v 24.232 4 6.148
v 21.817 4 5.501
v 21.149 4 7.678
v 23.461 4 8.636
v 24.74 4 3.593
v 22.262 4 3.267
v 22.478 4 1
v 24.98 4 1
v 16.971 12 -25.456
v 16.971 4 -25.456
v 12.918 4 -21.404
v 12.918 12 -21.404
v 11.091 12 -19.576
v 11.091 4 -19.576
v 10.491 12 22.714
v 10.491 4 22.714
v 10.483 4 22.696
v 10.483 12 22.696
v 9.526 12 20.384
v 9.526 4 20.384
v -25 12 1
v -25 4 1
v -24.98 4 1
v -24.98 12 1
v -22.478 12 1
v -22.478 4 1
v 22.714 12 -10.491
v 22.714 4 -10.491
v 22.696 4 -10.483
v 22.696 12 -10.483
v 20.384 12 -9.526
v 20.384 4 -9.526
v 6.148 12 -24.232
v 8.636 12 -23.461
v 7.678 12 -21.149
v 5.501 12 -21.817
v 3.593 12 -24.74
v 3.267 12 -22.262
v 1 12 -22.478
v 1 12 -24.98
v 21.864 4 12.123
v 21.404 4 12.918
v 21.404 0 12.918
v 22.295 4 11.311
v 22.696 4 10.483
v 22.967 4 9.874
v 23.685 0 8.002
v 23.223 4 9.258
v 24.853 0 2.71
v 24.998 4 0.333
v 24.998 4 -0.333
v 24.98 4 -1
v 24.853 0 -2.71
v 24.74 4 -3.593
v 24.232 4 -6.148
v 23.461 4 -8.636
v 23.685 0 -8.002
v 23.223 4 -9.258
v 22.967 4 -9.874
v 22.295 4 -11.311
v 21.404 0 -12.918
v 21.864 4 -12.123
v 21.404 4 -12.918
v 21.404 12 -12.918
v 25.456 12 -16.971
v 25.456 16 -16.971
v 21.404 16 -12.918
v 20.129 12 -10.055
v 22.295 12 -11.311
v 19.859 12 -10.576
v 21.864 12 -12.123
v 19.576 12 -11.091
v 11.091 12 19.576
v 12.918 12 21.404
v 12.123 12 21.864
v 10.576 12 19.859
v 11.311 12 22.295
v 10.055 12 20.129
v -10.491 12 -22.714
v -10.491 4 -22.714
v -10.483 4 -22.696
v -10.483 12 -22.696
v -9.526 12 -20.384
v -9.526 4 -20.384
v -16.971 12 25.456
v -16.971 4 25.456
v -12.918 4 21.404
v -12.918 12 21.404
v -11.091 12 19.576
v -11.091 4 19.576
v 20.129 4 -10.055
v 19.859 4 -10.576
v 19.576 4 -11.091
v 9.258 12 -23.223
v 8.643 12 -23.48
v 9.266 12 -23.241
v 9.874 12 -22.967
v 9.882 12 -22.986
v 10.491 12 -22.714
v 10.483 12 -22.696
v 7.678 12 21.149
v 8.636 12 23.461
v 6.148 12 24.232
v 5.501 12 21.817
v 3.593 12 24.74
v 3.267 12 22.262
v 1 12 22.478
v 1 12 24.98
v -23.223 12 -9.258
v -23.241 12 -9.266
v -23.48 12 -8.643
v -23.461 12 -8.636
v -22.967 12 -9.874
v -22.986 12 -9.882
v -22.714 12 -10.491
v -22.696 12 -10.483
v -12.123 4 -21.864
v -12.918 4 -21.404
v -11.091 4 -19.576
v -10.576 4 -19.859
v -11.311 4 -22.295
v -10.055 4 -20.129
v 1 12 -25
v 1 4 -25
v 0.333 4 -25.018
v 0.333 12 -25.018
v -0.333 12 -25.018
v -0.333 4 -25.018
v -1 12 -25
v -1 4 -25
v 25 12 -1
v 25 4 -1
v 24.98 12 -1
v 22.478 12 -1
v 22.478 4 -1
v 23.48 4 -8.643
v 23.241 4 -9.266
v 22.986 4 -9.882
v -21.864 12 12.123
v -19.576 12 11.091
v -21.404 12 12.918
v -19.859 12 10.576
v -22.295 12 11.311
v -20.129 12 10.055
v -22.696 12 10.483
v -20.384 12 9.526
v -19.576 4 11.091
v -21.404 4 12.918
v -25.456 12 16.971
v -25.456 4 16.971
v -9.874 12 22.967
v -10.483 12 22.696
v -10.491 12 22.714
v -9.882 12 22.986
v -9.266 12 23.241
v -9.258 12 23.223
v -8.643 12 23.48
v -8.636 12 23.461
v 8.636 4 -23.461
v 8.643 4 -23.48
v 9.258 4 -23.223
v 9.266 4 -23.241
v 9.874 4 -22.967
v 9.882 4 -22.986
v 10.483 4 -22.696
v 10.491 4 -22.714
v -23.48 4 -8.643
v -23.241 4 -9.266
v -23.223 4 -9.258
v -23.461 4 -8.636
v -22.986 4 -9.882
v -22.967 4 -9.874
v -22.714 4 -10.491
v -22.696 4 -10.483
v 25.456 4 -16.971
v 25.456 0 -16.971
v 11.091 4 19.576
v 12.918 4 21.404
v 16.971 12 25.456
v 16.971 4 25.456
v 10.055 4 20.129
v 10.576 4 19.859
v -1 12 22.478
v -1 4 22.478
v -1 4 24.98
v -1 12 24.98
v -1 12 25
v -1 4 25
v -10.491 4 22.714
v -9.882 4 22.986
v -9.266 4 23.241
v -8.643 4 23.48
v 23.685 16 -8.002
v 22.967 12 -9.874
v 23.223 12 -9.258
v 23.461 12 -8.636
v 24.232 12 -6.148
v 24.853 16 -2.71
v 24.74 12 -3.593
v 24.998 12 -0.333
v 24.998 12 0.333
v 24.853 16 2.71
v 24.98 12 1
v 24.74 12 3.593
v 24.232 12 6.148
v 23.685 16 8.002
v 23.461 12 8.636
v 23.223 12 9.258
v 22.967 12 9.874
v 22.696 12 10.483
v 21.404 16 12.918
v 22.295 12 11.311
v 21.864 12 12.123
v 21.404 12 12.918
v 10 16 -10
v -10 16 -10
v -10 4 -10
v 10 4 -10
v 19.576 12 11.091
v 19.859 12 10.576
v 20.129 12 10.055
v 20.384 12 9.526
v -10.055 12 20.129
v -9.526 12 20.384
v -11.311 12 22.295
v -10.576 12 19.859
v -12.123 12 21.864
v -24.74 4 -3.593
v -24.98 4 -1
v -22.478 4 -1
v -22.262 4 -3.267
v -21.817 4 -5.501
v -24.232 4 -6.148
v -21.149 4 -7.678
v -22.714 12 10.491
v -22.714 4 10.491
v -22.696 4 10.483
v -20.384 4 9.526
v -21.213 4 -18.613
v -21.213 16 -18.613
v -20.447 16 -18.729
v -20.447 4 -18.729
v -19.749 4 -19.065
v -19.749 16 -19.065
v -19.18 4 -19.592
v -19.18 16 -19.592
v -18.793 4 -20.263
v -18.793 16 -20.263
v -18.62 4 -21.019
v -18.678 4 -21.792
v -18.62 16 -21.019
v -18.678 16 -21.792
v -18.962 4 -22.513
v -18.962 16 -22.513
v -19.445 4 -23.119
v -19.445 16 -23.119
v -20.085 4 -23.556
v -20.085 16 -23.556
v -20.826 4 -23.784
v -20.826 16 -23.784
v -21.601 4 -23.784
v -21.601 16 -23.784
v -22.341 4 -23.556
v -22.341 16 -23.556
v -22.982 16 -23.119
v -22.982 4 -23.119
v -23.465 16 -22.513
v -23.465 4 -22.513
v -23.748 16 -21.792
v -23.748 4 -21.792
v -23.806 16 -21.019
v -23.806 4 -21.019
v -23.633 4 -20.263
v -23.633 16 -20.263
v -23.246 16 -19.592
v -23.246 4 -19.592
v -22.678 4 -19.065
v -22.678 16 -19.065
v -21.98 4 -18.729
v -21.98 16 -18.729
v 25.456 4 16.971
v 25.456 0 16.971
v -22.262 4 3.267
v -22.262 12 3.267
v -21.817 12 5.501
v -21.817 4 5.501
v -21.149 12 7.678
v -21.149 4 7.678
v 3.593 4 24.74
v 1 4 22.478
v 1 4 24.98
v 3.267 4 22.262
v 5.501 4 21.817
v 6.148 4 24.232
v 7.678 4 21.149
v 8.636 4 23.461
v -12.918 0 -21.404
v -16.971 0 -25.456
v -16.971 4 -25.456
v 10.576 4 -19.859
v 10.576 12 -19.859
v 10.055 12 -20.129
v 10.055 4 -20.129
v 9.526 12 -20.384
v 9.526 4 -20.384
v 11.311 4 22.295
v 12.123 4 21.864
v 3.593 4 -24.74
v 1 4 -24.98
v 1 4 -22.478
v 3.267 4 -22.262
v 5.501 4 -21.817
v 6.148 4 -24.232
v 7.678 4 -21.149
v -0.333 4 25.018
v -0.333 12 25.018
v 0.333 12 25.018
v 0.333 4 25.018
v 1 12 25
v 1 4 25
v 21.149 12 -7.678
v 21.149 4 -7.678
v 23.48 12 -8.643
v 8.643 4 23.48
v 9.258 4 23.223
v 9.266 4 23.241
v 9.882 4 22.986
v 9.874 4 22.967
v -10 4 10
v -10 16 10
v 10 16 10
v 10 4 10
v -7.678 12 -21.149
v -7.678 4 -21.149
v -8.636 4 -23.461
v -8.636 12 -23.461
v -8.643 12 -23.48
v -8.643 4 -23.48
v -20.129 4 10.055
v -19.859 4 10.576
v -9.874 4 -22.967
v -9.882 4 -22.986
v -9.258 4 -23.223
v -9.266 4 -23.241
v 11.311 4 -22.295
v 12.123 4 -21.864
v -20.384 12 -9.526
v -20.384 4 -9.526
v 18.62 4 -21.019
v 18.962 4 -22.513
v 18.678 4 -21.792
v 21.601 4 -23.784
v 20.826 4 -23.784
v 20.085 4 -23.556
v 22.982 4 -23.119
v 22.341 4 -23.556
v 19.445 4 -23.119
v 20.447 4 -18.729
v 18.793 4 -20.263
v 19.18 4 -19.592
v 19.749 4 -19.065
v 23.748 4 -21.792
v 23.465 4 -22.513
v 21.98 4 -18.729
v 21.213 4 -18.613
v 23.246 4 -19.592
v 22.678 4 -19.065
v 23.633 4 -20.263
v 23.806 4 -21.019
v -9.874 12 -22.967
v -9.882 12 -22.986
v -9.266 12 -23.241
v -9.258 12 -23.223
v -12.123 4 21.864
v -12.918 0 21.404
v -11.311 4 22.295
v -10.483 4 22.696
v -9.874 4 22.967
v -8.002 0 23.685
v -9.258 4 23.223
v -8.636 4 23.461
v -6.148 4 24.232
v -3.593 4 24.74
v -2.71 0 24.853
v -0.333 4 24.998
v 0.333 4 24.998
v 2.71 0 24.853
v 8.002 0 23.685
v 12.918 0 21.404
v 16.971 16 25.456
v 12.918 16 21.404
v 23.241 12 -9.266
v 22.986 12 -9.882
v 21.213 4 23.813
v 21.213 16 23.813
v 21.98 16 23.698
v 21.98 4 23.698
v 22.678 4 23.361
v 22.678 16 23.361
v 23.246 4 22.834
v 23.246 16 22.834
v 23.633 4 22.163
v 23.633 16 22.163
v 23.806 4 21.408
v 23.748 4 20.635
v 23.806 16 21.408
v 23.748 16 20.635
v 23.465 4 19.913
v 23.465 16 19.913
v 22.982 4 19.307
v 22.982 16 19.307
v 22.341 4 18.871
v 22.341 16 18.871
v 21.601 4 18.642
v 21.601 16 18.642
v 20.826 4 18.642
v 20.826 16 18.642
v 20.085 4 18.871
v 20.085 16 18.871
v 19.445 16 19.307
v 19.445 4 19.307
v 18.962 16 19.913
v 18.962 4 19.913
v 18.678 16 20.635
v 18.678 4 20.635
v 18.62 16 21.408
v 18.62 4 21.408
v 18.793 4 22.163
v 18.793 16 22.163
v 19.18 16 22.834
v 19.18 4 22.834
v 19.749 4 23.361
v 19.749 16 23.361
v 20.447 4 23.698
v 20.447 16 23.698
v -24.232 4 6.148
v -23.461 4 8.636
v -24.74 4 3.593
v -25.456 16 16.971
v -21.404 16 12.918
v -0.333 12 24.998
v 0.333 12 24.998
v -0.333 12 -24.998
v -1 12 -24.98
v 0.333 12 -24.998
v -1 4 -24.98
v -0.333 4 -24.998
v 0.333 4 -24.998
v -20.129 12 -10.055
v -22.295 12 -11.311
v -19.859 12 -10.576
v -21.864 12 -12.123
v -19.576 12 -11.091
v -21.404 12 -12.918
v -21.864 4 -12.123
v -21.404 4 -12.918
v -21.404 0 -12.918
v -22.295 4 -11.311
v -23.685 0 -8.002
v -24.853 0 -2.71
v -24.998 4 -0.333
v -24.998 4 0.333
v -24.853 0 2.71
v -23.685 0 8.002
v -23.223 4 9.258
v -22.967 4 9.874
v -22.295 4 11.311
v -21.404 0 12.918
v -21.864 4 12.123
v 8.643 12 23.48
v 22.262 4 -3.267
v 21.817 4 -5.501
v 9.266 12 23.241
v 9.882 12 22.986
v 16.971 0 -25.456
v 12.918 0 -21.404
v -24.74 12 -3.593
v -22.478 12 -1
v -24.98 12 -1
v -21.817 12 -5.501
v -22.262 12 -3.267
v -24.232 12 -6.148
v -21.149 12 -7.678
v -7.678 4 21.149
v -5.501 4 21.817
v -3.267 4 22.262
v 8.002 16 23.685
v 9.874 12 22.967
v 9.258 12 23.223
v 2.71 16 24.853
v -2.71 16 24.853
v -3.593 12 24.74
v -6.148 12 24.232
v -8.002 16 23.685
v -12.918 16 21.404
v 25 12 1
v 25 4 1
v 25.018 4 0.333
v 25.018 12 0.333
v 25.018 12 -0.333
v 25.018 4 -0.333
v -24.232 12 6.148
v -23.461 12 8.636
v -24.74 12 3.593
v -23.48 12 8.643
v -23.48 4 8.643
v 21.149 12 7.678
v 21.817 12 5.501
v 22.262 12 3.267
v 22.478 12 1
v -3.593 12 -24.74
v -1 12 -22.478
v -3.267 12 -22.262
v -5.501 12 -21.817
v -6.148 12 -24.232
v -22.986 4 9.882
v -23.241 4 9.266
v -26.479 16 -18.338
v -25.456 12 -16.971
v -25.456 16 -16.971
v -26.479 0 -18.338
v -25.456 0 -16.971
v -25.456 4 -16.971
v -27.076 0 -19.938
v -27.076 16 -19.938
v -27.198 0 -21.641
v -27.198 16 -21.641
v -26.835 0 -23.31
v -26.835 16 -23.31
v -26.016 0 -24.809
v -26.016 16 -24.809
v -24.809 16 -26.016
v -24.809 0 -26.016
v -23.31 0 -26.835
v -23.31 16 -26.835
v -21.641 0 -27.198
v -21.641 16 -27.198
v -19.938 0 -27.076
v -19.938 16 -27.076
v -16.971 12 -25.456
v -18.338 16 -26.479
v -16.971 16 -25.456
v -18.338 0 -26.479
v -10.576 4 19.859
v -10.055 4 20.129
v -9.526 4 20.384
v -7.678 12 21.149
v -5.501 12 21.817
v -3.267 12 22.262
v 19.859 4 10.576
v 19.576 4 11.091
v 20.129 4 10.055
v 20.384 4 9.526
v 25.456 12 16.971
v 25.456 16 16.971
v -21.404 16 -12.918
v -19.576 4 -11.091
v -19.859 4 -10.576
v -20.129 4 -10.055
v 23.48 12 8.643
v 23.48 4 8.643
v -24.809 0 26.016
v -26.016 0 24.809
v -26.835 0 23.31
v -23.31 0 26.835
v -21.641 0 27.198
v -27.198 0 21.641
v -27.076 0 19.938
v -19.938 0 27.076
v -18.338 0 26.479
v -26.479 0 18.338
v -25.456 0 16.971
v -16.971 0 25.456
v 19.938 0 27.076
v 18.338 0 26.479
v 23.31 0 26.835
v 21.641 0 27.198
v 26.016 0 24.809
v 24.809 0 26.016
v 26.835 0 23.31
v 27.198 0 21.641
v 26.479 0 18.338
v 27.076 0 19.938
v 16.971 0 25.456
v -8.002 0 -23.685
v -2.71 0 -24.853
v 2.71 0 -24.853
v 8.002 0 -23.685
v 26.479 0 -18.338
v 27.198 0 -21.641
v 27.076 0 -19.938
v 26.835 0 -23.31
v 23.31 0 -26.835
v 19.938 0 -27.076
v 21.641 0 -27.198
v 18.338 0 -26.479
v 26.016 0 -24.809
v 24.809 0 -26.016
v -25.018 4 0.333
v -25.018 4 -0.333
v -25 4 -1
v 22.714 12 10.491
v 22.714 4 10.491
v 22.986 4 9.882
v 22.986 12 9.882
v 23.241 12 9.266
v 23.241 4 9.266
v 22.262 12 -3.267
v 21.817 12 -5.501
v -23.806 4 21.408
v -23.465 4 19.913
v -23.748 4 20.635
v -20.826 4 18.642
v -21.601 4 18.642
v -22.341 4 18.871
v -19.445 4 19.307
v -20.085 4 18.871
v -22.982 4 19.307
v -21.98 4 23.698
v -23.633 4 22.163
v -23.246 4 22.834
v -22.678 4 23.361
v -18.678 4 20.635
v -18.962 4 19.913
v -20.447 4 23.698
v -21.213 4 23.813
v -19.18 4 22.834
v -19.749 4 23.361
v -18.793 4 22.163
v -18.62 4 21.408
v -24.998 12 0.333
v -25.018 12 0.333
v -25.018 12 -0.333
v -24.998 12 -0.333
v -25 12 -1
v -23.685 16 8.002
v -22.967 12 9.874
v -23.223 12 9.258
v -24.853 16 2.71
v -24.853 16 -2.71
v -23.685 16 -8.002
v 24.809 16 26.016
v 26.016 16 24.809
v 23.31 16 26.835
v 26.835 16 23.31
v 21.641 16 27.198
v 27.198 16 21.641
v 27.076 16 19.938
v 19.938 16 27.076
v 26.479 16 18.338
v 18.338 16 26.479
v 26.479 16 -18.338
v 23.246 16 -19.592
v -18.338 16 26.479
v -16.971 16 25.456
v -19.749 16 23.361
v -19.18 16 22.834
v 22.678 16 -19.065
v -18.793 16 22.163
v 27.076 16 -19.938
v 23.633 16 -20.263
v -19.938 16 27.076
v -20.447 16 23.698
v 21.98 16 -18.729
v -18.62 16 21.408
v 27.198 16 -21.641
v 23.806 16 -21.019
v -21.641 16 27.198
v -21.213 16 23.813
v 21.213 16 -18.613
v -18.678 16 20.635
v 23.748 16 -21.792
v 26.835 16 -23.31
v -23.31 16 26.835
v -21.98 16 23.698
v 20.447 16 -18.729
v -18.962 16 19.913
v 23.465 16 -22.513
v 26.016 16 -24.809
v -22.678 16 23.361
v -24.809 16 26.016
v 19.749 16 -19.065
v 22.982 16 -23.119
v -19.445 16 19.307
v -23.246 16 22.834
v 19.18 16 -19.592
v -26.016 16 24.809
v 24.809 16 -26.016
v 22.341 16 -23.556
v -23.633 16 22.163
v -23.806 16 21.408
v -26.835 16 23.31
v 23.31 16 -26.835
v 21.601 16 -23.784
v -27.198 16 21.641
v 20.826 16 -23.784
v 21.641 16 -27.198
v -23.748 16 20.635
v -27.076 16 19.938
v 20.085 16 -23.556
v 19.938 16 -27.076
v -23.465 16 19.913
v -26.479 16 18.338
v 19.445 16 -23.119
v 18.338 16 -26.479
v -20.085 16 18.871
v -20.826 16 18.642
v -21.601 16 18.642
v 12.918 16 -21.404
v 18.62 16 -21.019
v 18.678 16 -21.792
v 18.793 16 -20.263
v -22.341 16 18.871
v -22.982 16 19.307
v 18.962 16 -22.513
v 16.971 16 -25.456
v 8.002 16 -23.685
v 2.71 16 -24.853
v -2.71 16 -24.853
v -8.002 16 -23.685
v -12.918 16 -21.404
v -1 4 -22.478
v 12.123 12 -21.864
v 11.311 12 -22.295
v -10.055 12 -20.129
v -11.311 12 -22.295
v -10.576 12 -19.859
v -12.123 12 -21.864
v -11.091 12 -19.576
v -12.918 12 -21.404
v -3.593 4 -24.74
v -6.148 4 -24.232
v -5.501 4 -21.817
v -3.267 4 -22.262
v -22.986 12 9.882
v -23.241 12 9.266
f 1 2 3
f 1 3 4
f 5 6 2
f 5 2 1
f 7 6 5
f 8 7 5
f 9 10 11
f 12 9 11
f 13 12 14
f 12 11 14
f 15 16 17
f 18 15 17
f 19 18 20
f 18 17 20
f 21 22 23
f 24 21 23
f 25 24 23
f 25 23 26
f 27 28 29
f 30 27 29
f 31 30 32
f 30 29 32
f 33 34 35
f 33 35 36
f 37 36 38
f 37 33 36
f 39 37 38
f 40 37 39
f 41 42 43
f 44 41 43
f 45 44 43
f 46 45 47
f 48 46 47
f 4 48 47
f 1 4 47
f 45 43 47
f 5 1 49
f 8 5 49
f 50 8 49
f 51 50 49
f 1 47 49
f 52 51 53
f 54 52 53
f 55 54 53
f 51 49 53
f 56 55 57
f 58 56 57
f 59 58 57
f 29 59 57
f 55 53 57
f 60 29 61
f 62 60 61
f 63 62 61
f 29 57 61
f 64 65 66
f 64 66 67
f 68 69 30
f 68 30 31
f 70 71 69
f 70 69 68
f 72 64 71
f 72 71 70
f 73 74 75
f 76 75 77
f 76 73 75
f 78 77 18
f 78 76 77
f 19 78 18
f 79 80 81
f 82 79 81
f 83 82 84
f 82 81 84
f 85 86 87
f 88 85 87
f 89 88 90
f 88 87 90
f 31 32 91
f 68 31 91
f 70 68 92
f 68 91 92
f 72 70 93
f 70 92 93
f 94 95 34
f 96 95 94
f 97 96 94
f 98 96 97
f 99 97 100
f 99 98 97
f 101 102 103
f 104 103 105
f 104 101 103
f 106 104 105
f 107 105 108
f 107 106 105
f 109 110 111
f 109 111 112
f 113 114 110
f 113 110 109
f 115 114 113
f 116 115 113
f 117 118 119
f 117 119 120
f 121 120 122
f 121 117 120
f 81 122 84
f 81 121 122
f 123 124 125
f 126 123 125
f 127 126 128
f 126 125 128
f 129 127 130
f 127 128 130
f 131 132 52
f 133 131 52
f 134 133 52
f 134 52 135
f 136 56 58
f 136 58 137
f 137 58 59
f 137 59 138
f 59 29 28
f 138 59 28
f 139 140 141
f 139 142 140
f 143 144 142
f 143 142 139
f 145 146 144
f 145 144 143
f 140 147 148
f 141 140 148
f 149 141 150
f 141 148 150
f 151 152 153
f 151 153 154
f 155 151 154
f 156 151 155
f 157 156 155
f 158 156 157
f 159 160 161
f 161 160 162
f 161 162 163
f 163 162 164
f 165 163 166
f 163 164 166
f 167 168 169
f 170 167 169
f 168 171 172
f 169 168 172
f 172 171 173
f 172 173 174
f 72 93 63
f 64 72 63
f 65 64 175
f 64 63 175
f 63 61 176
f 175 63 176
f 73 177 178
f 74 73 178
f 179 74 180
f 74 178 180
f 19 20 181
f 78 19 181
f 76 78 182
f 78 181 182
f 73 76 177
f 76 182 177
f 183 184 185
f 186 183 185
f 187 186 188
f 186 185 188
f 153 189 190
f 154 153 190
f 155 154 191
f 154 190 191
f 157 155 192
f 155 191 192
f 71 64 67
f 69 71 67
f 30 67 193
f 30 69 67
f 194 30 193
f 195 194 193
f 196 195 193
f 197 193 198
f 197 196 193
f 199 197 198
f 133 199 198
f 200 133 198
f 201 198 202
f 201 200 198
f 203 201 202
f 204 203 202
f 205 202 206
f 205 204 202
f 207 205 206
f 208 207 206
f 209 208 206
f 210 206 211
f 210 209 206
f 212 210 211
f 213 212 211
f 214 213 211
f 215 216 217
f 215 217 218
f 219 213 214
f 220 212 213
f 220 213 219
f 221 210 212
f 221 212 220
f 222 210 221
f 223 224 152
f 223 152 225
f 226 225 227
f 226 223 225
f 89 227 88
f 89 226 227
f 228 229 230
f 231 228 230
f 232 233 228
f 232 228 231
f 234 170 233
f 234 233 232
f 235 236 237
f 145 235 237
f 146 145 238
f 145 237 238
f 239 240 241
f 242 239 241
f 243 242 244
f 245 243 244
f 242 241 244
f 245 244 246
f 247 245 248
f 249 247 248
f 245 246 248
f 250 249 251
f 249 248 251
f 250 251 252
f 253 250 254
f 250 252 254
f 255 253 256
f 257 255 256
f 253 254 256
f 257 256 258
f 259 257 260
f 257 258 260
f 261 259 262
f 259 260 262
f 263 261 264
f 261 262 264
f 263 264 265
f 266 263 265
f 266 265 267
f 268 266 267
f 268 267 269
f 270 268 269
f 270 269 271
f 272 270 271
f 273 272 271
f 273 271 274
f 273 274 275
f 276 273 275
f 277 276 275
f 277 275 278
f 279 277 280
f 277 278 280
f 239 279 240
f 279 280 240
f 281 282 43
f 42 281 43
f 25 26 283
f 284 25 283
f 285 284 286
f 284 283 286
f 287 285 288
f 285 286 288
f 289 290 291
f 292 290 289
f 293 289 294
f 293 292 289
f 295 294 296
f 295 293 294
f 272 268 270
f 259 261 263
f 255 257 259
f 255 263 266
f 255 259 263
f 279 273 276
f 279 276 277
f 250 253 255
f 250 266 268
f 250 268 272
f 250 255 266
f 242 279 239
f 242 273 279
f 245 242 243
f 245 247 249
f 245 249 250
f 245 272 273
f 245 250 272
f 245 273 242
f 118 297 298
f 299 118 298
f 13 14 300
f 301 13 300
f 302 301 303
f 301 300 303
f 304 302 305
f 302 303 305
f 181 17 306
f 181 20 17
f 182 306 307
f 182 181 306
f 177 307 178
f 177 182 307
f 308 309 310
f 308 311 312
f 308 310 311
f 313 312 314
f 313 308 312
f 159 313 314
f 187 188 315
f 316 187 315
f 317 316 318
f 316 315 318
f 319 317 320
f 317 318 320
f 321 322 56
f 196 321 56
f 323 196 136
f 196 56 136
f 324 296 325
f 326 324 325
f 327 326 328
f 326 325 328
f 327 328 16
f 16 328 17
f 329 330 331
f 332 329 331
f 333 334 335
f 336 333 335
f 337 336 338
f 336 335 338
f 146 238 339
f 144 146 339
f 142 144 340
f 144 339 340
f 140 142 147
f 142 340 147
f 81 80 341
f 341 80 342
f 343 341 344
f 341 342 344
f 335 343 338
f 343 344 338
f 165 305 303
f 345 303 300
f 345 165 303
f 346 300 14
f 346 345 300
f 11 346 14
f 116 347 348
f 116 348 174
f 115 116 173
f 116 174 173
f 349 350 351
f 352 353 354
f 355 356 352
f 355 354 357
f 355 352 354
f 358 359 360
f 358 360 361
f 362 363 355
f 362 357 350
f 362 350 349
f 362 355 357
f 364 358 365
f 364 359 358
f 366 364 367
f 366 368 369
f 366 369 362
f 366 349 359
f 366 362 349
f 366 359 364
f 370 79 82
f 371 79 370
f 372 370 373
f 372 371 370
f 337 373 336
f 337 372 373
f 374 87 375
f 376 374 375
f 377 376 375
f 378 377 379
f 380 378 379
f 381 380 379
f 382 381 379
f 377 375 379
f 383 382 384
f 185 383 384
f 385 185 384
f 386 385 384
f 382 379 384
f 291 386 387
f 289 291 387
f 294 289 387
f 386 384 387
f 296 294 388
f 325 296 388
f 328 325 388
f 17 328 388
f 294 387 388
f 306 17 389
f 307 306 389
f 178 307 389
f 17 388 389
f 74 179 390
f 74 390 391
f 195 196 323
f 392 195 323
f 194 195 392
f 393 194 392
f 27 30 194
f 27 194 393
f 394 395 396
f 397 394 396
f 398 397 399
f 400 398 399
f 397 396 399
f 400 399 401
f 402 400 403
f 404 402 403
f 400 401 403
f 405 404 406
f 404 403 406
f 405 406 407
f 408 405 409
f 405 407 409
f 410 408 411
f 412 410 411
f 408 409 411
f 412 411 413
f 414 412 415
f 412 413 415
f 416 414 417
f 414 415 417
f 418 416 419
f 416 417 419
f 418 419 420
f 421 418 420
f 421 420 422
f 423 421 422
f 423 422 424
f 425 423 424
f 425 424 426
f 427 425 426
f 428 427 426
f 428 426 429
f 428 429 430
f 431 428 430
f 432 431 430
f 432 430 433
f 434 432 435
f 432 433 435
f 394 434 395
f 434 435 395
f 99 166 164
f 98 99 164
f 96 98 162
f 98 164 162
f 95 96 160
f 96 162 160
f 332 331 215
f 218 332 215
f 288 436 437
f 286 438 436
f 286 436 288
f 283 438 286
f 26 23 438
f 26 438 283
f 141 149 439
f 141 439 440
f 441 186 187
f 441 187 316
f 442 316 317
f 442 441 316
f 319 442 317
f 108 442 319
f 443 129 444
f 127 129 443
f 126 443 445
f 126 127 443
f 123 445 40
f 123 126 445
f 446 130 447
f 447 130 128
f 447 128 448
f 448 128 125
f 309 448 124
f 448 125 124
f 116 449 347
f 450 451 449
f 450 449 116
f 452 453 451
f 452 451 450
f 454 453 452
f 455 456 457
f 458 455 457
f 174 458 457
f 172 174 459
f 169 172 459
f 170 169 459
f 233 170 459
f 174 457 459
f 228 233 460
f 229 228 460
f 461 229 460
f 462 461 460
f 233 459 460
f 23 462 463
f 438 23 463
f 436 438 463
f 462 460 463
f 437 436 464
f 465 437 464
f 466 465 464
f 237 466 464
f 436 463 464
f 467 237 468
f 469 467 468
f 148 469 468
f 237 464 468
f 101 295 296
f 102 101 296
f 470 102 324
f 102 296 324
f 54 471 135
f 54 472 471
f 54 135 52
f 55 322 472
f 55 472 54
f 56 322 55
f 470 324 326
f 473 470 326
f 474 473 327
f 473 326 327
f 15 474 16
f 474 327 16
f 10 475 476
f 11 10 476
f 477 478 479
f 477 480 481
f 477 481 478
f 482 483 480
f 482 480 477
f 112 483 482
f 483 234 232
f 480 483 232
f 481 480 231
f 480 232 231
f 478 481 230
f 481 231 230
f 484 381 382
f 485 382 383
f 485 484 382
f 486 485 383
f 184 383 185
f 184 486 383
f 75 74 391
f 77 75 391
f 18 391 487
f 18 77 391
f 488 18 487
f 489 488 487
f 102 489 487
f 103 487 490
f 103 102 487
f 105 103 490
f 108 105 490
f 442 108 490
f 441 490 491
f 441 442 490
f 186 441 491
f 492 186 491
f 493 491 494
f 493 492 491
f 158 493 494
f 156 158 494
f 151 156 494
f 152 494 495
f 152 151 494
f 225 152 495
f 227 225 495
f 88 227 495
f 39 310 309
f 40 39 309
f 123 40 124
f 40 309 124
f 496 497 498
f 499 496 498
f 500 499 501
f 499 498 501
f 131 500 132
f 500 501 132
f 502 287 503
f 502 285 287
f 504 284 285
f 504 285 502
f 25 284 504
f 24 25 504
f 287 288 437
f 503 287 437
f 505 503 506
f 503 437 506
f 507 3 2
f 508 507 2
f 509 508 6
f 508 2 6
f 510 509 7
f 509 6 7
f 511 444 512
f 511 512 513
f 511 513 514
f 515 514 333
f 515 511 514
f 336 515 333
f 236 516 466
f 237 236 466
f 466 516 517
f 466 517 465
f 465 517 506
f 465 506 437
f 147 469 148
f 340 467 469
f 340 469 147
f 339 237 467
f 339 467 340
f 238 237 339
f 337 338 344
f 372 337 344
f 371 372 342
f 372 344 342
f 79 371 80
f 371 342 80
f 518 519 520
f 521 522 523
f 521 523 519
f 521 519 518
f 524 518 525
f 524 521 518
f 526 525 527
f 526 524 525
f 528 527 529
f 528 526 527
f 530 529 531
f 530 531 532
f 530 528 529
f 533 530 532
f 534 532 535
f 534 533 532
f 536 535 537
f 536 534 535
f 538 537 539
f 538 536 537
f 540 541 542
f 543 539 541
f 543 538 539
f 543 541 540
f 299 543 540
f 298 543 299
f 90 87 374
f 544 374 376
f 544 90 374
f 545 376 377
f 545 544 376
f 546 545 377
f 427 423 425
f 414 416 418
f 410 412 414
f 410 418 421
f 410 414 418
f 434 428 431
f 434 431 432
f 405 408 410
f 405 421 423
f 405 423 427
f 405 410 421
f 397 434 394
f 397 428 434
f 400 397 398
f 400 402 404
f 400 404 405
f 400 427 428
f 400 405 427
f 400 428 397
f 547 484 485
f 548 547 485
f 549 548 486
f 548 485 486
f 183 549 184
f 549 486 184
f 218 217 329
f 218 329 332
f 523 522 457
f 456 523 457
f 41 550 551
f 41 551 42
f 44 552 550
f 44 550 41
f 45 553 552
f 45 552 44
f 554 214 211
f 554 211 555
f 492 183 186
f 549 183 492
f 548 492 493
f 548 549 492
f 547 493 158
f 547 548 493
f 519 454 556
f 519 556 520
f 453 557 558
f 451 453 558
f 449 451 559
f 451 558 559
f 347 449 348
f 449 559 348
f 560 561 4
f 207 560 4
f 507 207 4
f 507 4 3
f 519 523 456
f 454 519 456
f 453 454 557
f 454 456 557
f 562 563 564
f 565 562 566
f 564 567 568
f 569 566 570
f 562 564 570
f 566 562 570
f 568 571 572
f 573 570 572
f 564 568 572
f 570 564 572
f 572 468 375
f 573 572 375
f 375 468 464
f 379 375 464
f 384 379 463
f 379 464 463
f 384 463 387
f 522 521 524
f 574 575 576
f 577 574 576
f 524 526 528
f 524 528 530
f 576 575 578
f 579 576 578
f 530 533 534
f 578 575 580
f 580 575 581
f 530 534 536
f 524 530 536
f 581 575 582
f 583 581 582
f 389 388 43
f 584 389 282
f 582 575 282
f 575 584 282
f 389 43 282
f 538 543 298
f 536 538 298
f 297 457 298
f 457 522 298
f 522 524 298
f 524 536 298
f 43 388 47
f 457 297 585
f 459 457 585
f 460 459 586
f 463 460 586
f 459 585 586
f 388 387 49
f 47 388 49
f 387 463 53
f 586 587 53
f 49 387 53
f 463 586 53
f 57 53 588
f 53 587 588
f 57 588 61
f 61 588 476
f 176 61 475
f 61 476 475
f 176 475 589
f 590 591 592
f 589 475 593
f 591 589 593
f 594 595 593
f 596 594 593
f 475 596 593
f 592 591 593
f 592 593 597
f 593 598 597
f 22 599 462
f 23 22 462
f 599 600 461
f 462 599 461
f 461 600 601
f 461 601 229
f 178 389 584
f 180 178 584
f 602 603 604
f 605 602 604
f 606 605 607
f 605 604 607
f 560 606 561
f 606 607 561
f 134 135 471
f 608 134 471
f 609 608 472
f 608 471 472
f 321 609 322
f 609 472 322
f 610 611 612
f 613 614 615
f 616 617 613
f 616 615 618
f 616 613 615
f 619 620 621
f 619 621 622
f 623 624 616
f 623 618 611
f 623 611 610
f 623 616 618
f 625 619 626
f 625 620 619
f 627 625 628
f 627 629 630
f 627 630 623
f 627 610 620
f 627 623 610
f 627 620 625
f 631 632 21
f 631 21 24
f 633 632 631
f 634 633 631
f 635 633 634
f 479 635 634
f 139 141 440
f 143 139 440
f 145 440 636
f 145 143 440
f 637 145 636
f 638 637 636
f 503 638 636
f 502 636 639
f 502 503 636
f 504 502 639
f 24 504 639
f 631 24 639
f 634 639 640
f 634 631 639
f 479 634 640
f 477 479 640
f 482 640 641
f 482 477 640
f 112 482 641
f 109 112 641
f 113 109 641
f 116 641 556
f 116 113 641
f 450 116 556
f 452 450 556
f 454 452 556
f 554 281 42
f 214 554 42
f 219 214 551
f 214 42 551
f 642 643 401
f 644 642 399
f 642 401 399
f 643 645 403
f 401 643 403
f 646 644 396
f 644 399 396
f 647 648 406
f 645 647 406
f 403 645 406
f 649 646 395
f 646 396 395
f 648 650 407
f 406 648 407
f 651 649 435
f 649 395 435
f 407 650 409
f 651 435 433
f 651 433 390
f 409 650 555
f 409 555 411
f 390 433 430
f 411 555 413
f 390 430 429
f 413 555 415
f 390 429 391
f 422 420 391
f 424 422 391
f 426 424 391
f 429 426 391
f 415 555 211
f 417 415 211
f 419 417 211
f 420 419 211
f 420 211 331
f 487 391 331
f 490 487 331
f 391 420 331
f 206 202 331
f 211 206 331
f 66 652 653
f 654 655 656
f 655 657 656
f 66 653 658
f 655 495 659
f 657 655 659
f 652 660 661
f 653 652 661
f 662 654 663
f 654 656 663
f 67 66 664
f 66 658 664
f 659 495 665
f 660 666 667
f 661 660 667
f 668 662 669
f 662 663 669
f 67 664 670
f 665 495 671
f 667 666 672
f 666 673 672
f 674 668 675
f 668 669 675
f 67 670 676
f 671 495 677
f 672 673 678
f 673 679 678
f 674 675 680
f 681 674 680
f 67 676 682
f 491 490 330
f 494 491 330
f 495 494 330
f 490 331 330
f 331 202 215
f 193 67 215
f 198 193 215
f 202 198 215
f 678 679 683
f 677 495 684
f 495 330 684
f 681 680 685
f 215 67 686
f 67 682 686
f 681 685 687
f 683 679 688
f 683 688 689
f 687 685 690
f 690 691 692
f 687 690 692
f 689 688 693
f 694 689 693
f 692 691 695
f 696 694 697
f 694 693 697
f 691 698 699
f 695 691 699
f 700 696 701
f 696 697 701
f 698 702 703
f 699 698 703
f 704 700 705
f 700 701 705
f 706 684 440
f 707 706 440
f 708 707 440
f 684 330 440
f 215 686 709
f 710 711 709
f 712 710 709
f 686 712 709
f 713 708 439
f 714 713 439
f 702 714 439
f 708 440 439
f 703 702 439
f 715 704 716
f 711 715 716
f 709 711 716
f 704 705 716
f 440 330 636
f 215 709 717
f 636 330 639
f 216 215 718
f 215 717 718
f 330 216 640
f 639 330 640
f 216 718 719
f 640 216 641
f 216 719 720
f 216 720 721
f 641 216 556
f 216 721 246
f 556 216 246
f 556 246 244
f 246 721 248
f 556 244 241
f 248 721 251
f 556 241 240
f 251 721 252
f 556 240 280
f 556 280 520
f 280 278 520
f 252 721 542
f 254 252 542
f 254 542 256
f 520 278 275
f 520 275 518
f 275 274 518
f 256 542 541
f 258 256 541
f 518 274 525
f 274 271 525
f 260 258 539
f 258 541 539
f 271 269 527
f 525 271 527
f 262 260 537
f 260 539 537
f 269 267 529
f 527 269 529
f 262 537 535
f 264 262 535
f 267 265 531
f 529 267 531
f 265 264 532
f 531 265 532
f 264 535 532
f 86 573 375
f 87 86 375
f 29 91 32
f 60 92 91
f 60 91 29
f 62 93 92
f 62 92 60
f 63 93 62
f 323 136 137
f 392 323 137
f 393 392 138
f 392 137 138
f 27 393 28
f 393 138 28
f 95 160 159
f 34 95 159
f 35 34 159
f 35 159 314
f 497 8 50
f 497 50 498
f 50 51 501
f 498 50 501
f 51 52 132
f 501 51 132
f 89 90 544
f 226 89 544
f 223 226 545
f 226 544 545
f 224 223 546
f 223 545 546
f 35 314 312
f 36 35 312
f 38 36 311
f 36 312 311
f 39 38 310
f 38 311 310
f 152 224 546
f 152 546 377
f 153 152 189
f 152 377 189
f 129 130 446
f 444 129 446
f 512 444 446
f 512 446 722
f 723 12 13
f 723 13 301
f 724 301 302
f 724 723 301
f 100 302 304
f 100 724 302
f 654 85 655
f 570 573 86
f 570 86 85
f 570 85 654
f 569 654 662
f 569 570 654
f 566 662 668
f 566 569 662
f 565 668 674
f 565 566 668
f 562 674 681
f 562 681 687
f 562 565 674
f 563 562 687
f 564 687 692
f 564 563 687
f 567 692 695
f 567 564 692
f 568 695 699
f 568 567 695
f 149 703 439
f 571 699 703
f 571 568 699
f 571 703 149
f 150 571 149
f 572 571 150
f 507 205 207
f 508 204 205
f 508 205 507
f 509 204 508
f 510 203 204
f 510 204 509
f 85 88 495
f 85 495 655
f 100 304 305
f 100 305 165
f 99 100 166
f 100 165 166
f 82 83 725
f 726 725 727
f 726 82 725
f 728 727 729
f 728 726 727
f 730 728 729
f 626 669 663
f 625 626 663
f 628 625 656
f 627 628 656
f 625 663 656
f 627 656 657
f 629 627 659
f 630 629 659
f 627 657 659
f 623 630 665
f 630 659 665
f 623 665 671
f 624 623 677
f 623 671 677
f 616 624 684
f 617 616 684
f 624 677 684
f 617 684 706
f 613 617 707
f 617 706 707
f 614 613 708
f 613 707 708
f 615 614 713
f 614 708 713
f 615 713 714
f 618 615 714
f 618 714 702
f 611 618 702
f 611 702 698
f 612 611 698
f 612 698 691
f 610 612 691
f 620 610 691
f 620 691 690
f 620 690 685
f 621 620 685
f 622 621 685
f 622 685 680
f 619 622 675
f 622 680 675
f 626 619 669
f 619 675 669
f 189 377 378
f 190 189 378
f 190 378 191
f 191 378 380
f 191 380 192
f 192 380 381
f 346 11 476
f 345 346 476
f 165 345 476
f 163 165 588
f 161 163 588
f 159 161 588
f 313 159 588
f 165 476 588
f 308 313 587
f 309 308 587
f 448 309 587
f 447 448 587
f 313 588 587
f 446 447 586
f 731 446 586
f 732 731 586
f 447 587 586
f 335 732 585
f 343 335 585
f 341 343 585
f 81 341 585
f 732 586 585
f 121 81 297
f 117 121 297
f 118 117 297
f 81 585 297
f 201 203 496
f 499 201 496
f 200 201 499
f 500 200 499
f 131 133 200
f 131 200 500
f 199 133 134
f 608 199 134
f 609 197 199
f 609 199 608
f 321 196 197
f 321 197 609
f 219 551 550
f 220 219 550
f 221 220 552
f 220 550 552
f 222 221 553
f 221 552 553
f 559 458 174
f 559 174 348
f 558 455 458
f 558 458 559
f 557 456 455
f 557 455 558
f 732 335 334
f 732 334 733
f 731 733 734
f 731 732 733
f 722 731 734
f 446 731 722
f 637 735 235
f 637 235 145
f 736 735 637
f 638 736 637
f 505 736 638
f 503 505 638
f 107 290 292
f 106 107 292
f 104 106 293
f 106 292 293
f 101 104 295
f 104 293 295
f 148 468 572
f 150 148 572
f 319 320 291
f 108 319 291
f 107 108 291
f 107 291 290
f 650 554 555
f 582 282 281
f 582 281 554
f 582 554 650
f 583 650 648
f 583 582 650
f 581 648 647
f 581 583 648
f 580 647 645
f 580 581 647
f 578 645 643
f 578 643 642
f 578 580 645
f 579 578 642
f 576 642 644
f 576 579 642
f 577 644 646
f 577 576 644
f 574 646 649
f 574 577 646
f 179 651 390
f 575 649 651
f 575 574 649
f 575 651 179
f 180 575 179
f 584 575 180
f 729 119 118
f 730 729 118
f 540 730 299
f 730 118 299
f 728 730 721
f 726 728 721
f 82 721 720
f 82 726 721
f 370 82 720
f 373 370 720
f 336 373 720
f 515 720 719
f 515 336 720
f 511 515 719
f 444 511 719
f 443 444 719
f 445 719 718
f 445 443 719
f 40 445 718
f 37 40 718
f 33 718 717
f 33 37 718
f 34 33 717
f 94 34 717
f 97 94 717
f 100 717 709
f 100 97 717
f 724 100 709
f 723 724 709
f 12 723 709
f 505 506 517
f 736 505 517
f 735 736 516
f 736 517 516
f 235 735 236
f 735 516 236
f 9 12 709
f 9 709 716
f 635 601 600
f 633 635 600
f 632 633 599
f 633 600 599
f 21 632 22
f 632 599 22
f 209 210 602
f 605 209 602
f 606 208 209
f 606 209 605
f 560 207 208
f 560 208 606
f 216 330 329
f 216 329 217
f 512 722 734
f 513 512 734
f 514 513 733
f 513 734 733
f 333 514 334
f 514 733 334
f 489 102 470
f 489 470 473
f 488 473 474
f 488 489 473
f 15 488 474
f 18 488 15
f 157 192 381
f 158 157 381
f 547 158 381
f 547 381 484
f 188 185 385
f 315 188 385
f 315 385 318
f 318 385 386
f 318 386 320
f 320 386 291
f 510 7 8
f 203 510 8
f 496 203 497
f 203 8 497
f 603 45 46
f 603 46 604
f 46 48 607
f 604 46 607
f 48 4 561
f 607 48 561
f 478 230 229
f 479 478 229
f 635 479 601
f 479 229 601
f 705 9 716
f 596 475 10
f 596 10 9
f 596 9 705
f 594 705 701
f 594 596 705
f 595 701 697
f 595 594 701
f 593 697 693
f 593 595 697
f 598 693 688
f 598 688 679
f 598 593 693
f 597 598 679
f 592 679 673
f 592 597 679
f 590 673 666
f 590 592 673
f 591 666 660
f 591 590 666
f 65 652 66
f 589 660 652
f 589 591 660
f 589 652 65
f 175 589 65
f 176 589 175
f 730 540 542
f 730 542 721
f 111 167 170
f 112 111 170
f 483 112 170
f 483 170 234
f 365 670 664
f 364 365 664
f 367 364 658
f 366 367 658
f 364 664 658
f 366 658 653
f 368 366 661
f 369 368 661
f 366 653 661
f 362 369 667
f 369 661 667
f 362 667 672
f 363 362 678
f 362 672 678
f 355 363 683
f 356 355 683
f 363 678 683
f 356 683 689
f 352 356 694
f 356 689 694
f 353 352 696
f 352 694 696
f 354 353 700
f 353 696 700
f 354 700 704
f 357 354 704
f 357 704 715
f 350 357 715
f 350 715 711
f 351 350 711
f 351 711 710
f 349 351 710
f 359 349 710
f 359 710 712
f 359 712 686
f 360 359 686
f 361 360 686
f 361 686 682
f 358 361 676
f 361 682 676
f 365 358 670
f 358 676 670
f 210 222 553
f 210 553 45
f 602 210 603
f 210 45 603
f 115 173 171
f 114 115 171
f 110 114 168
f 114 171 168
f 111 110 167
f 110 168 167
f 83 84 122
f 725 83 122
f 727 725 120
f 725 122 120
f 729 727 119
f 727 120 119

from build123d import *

# Parameters (mm, degrees)
BOSS_EXTRUDE1_DEPTH = 4
BOSS_EXTRUDE2_DEPTH = 8
BOSS_EXTRUDE3_DEPTH = 4
SKETCH4_R           = 2.6
CUT_EXTRUDE1_DEPTH  = 12
SKETCH5_W           = 20
SKETCH5_H           = 20
CUT_EXTRUDE2_DEPTH  = 12


with BuildPart() as part:
    # Sketch1 → Boss-Extrude1 (new body)
    with BuildSketch(Plane(origin=(0, 0, 0), x_dir=(1, 0, 0), z_dir=(0, 1, 0))):
        with BuildLine():
            Line((21.403642989, 12.918361615), (25.455844123, 16.970562748))
            ThreePointArc((25.455844123, 16.970562748), (25.455844123, 25.455844123), (16.970562748, 25.455844123))
            Line((16.970562748, 25.455844123), (12.918361615, 21.403642989))
            ThreePointArc((12.918361615, 21.403642989), (0, 25), (-12.918361615, 21.403642989))
            Line((-12.918361615, 21.403642989), (-16.970562748, 25.455844123))
            ThreePointArc((-16.970562748, 25.455844123), (-25.455844123, 25.455844123), (-25.455844123, 16.970562748))
            Line((-25.455844123, 16.970562748), (-21.403642989, 12.918361615))
            ThreePointArc((-21.403642989, 12.918361615), (-25, 0), (-21.403642989, -12.918361615))
            Line((-21.403642989, -12.918361615), (-25.455844123, -16.970562748))
            ThreePointArc((-25.455844123, -16.970562748), (-25.455844123, -25.455844123), (-16.970562748, -25.455844123))
            Line((-16.970562748, -25.455844123), (-12.918361615, -21.403642989))
            ThreePointArc((-12.918361615, -21.403642989), (0, -25), (12.918361615, -21.403642989))
            Line((12.918361615, -21.403642989), (16.970562748, -25.455844123))
            ThreePointArc((16.970562748, -25.455844123), (25.455844123, -25.455844123), (25.455844123, -16.970562748))
            Line((25.455844123, -16.970562748), (21.403642989, -12.918361615))
            ThreePointArc((21.403642989, -12.918361615), (25, 0), (21.403642989, 12.918361615))
        make_face()
    extrude(amount=BOSS_EXTRUDE1_DEPTH)

    # Sketch2 → Boss-Extrude2 (add)
    with BuildSketch(Plane(origin=(0, 4, 0), x_dir=(1, 0, 0), z_dir=(0, 1, 0))):
        with BuildLine():
            Line((-1, 25), (-1, 22.477766793))
            ThreePointArc((-1, 22.477766793), (-4.389532245, 22.067668809), (-7.677989416, 21.149432109))
            Line((-7.677989416, 21.149432109), (-8.643206277, 23.479671745))
            ThreePointArc((-8.643206277, 23.479671745), (-9.574736419, 23.115458518), (-10.490965342, 22.71430488))
            Line((-10.490965342, 22.71430488), (-9.525748481, 20.384065244))
            ThreePointArc((-9.525748481, 20.384065244), (-10.316353506, 19.995570768), (-11.091145538, 19.576426912))
            Line((-11.091145538, 19.576426912), (-16.970562748, 25.455844123))
            ThreePointArc((-16.970562748, 25.455844123), (-25.455844123, 25.455844123), (-25.455844123, 16.970562748))
            Line((-25.455844123, 16.970562748), (-19.576426912, 11.091145538))
            ThreePointArc((-19.576426912, 11.091145538), (-19.995570768, 10.316353506), (-20.384065244, 9.525748481))
            Line((-20.384065244, 9.525748481), (-22.71430488, 10.490965342))
            ThreePointArc((-22.71430488, 10.490965342), (-23.115458518, 9.574736419), (-23.479671745, 8.643206277))
            Line((-23.479671745, 8.643206277), (-21.149432109, 7.677989416))
            ThreePointArc((-21.149432109, 7.677989416), (-22.067668809, 4.389532245), (-22.477766793, 1))
            Line((-22.477766793, 1), (-25, 1))
            ThreePointArc((-25, 1), (-25.019992006, 0), (-25, -1))
            Line((-25, -1), (-22.477766793, -1))
            ThreePointArc((-22.477766793, -1), (-22.067668809, -4.389532245), (-21.149432109, -7.677989416))
            Line((-21.149432109, -7.677989416), (-23.479671745, -8.643206277))
            ThreePointArc((-23.479671745, -8.643206277), (-23.115458518, -9.574736419), (-22.71430488, -10.490965342))
            Line((-22.71430488, -10.490965342), (-20.384065244, -9.525748481))
            ThreePointArc((-20.384065244, -9.525748481), (-19.995570768, -10.316353506), (-19.576426912, -11.091145538))
            Line((-19.576426912, -11.091145538), (-25.455844123, -16.970562748))
            ThreePointArc((-25.455844123, -16.970562748), (-25.455844123, -25.455844123), (-16.970562748, -25.455844123))
            Line((-16.970562748, -25.455844123), (-11.091145538, -19.576426912))
            ThreePointArc((-11.091145538, -19.576426912), (-10.316353506, -19.995570768), (-9.525748481, -20.384065244))
            Line((-9.525748481, -20.384065244), (-10.490965342, -22.71430488))
            ThreePointArc((-10.490965342, -22.71430488), (-9.574736419, -23.115458518), (-8.643206277, -23.479671745))
            Line((-8.643206277, -23.479671745), (-7.677989416, -21.149432109))
            ThreePointArc((-7.677989416, -21.149432109), (-4.389532245, -22.067668809), (-1, -22.477766793))
            Line((-1, -22.477766793), (-1, -25))
            ThreePointArc((-1, -25), (0, -25.019992006), (1, -25))
            Line((1, -25), (1, -22.477766793))
            ThreePointArc((1, -22.477766793), (4.389532245, -22.067668809), (7.677989416, -21.149432109))
            Line((7.677989416, -21.149432109), (8.643206277, -23.479671745))
            ThreePointArc((8.643206277, -23.479671745), (9.574736419, -23.115458518), (10.490965342, -22.71430488))
            Line((10.490965342, -22.71430488), (9.525748481, -20.384065244))
            ThreePointArc((9.525748481, -20.384065244), (10.316353506, -19.995570768), (11.091145538, -19.576426912))
            Line((11.091145538, -19.576426912), (16.970562748, -25.455844123))
            ThreePointArc((16.970562748, -25.455844123), (25.455844123, -25.455844123), (25.455844123, -16.970562748))
            Line((25.455844123, -16.970562748), (19.576426912, -11.091145538))
            ThreePointArc((19.576426912, -11.091145538), (19.995570768, -10.316353506), (20.384065244, -9.525748481))
            Line((20.384065244, -9.525748481), (22.71430488, -10.490965342))
            ThreePointArc((22.71430488, -10.490965342), (23.115458518, -9.574736419), (23.479671745, -8.643206277))
            Line((23.479671745, -8.643206277), (21.149432109, -7.677989416))
            ThreePointArc((21.149432109, -7.677989416), (22.067668809, -4.389532245), (22.477766793, -1))
            Line((22.477766793, -1), (25, -1))
            ThreePointArc((25, -1), (25.019992006, 0), (25, 1))
            Line((25, 1), (22.477766793, 1))
            ThreePointArc((22.477766793, 1), (22.067668809, 4.389532245), (21.149432109, 7.677989416))
            Line((21.149432109, 7.677989416), (23.479671745, 8.643206277))
            ThreePointArc((23.479671745, 8.643206277), (23.115458518, 9.574736419), (22.71430488, 10.490965342))
            Line((22.71430488, 10.490965342), (20.384065244, 9.525748481))
            ThreePointArc((20.384065244, 9.525748481), (19.995570768, 10.316353506), (19.576426912, 11.091145538))
            Line((19.576426912, 11.091145538), (25.455844123, 16.970562748))
            ThreePointArc((25.455844123, 16.970562748), (25.455844123, 25.455844123), (16.970562748, 25.455844123))
            Line((16.970562748, 25.455844123), (11.091145538, 19.576426912))
            ThreePointArc((11.091145538, 19.576426912), (10.316353506, 19.995570768), (9.525748481, 20.384065244))
            Line((9.525748481, 20.384065244), (10.490965342, 22.71430488))
            ThreePointArc((10.490965342, 22.71430488), (9.574736419, 23.115458518), (8.643206277, 23.479671745))
            Line((8.643206277, 23.479671745), (7.677989416, 21.149432109))
            ThreePointArc((7.677989416, 21.149432109), (4.389532245, 22.067668809), (1, 22.477766793))
            Line((1, 22.477766793), (1, 25))
            ThreePointArc((1, 25), (0, 25.019992006), (-1, 25))
        make_face()
    extrude(amount=BOSS_EXTRUDE2_DEPTH)

    # Sketch3 → Boss-Extrude3 (add)
    with BuildSketch(Plane(origin=(0, 12, 0), x_dir=(1, 0, 0), z_dir=(0, 1, 0))):
        with BuildLine():
            Line((21.403642989, -12.918361615), (25.455844123, -16.970562748))
            ThreePointArc((25.455844123, -16.970562748), (25.455844123, -25.455844123), (16.970562748, -25.455844123))
            Line((16.970562748, -25.455844123), (12.918361615, -21.403642989))
            ThreePointArc((12.918361615, -21.403642989), (0, -25), (-12.918361615, -21.403642989))
            Line((-12.918361615, -21.403642989), (-16.970562748, -25.455844123))
            ThreePointArc((-16.970562748, -25.455844123), (-25.455844123, -25.455844123), (-25.455844123, -16.970562748))
            Line((-25.455844123, -16.970562748), (-21.403642989, -12.918361615))
            ThreePointArc((-21.403642989, -12.918361615), (-25, 0), (-21.403642989, 12.918361615))
            Line((-21.403642989, 12.918361615), (-25.455844123, 16.970562748))
            ThreePointArc((-25.455844123, 16.970562748), (-25.455844123, 25.455844123), (-16.970562748, 25.455844123))
            Line((-16.970562748, 25.455844123), (-12.918361615, 21.403642989))
            ThreePointArc((-12.918361615, 21.403642989), (0, 25), (12.918361615, 21.403642989))
            Line((12.918361615, 21.403642989), (16.970562748, 25.455844123))
            ThreePointArc((16.970562748, 25.455844123), (25.455844123, 25.455844123), (25.455844123, 16.970562748))
            Line((25.455844123, 16.970562748), (21.403642989, 12.918361615))
            ThreePointArc((21.403642989, 12.918361615), (25, 0), (21.403642989, -12.918361615))
        make_face()
    extrude(amount=BOSS_EXTRUDE3_DEPTH)

    # Sketch4 → Cut-Extrude1 (cut)
    with BuildSketch(Plane(origin=(0, 16, 0), x_dir=(1, 0, 0), z_dir=(0, 1, 0))):
        with Locations(Location((-21.213203436, -21.213203436, 0), (0, 0, 270))):
            Circle(SKETCH4_R)
        with Locations(Location((-21.213203436, 21.213203436, 0), (0, 0, 270))):
            Circle(SKETCH4_R)
        with Locations(Location((21.213203436, 21.213203436, 0), (0, 0, 270))):
            Circle(SKETCH4_R)
        with Locations(Location((21.213203436, -21.213203436, 0), (0, 0, 270))):
            Circle(SKETCH4_R)
    extrude(amount=-CUT_EXTRUDE1_DEPTH, mode=Mode.SUBTRACT)

    # Sketch5 → Cut-Extrude2 (cut)
    with BuildSketch(Plane(origin=(0, 16, 0), x_dir=(1, 0, 0), z_dir=(0, 1, 0))):
        Rectangle(SKETCH5_W, SKETCH5_H)
    extrude(amount=-CUT_EXTRUDE2_DEPTH, mode=Mode.SUBTRACT)


solid = part.part
